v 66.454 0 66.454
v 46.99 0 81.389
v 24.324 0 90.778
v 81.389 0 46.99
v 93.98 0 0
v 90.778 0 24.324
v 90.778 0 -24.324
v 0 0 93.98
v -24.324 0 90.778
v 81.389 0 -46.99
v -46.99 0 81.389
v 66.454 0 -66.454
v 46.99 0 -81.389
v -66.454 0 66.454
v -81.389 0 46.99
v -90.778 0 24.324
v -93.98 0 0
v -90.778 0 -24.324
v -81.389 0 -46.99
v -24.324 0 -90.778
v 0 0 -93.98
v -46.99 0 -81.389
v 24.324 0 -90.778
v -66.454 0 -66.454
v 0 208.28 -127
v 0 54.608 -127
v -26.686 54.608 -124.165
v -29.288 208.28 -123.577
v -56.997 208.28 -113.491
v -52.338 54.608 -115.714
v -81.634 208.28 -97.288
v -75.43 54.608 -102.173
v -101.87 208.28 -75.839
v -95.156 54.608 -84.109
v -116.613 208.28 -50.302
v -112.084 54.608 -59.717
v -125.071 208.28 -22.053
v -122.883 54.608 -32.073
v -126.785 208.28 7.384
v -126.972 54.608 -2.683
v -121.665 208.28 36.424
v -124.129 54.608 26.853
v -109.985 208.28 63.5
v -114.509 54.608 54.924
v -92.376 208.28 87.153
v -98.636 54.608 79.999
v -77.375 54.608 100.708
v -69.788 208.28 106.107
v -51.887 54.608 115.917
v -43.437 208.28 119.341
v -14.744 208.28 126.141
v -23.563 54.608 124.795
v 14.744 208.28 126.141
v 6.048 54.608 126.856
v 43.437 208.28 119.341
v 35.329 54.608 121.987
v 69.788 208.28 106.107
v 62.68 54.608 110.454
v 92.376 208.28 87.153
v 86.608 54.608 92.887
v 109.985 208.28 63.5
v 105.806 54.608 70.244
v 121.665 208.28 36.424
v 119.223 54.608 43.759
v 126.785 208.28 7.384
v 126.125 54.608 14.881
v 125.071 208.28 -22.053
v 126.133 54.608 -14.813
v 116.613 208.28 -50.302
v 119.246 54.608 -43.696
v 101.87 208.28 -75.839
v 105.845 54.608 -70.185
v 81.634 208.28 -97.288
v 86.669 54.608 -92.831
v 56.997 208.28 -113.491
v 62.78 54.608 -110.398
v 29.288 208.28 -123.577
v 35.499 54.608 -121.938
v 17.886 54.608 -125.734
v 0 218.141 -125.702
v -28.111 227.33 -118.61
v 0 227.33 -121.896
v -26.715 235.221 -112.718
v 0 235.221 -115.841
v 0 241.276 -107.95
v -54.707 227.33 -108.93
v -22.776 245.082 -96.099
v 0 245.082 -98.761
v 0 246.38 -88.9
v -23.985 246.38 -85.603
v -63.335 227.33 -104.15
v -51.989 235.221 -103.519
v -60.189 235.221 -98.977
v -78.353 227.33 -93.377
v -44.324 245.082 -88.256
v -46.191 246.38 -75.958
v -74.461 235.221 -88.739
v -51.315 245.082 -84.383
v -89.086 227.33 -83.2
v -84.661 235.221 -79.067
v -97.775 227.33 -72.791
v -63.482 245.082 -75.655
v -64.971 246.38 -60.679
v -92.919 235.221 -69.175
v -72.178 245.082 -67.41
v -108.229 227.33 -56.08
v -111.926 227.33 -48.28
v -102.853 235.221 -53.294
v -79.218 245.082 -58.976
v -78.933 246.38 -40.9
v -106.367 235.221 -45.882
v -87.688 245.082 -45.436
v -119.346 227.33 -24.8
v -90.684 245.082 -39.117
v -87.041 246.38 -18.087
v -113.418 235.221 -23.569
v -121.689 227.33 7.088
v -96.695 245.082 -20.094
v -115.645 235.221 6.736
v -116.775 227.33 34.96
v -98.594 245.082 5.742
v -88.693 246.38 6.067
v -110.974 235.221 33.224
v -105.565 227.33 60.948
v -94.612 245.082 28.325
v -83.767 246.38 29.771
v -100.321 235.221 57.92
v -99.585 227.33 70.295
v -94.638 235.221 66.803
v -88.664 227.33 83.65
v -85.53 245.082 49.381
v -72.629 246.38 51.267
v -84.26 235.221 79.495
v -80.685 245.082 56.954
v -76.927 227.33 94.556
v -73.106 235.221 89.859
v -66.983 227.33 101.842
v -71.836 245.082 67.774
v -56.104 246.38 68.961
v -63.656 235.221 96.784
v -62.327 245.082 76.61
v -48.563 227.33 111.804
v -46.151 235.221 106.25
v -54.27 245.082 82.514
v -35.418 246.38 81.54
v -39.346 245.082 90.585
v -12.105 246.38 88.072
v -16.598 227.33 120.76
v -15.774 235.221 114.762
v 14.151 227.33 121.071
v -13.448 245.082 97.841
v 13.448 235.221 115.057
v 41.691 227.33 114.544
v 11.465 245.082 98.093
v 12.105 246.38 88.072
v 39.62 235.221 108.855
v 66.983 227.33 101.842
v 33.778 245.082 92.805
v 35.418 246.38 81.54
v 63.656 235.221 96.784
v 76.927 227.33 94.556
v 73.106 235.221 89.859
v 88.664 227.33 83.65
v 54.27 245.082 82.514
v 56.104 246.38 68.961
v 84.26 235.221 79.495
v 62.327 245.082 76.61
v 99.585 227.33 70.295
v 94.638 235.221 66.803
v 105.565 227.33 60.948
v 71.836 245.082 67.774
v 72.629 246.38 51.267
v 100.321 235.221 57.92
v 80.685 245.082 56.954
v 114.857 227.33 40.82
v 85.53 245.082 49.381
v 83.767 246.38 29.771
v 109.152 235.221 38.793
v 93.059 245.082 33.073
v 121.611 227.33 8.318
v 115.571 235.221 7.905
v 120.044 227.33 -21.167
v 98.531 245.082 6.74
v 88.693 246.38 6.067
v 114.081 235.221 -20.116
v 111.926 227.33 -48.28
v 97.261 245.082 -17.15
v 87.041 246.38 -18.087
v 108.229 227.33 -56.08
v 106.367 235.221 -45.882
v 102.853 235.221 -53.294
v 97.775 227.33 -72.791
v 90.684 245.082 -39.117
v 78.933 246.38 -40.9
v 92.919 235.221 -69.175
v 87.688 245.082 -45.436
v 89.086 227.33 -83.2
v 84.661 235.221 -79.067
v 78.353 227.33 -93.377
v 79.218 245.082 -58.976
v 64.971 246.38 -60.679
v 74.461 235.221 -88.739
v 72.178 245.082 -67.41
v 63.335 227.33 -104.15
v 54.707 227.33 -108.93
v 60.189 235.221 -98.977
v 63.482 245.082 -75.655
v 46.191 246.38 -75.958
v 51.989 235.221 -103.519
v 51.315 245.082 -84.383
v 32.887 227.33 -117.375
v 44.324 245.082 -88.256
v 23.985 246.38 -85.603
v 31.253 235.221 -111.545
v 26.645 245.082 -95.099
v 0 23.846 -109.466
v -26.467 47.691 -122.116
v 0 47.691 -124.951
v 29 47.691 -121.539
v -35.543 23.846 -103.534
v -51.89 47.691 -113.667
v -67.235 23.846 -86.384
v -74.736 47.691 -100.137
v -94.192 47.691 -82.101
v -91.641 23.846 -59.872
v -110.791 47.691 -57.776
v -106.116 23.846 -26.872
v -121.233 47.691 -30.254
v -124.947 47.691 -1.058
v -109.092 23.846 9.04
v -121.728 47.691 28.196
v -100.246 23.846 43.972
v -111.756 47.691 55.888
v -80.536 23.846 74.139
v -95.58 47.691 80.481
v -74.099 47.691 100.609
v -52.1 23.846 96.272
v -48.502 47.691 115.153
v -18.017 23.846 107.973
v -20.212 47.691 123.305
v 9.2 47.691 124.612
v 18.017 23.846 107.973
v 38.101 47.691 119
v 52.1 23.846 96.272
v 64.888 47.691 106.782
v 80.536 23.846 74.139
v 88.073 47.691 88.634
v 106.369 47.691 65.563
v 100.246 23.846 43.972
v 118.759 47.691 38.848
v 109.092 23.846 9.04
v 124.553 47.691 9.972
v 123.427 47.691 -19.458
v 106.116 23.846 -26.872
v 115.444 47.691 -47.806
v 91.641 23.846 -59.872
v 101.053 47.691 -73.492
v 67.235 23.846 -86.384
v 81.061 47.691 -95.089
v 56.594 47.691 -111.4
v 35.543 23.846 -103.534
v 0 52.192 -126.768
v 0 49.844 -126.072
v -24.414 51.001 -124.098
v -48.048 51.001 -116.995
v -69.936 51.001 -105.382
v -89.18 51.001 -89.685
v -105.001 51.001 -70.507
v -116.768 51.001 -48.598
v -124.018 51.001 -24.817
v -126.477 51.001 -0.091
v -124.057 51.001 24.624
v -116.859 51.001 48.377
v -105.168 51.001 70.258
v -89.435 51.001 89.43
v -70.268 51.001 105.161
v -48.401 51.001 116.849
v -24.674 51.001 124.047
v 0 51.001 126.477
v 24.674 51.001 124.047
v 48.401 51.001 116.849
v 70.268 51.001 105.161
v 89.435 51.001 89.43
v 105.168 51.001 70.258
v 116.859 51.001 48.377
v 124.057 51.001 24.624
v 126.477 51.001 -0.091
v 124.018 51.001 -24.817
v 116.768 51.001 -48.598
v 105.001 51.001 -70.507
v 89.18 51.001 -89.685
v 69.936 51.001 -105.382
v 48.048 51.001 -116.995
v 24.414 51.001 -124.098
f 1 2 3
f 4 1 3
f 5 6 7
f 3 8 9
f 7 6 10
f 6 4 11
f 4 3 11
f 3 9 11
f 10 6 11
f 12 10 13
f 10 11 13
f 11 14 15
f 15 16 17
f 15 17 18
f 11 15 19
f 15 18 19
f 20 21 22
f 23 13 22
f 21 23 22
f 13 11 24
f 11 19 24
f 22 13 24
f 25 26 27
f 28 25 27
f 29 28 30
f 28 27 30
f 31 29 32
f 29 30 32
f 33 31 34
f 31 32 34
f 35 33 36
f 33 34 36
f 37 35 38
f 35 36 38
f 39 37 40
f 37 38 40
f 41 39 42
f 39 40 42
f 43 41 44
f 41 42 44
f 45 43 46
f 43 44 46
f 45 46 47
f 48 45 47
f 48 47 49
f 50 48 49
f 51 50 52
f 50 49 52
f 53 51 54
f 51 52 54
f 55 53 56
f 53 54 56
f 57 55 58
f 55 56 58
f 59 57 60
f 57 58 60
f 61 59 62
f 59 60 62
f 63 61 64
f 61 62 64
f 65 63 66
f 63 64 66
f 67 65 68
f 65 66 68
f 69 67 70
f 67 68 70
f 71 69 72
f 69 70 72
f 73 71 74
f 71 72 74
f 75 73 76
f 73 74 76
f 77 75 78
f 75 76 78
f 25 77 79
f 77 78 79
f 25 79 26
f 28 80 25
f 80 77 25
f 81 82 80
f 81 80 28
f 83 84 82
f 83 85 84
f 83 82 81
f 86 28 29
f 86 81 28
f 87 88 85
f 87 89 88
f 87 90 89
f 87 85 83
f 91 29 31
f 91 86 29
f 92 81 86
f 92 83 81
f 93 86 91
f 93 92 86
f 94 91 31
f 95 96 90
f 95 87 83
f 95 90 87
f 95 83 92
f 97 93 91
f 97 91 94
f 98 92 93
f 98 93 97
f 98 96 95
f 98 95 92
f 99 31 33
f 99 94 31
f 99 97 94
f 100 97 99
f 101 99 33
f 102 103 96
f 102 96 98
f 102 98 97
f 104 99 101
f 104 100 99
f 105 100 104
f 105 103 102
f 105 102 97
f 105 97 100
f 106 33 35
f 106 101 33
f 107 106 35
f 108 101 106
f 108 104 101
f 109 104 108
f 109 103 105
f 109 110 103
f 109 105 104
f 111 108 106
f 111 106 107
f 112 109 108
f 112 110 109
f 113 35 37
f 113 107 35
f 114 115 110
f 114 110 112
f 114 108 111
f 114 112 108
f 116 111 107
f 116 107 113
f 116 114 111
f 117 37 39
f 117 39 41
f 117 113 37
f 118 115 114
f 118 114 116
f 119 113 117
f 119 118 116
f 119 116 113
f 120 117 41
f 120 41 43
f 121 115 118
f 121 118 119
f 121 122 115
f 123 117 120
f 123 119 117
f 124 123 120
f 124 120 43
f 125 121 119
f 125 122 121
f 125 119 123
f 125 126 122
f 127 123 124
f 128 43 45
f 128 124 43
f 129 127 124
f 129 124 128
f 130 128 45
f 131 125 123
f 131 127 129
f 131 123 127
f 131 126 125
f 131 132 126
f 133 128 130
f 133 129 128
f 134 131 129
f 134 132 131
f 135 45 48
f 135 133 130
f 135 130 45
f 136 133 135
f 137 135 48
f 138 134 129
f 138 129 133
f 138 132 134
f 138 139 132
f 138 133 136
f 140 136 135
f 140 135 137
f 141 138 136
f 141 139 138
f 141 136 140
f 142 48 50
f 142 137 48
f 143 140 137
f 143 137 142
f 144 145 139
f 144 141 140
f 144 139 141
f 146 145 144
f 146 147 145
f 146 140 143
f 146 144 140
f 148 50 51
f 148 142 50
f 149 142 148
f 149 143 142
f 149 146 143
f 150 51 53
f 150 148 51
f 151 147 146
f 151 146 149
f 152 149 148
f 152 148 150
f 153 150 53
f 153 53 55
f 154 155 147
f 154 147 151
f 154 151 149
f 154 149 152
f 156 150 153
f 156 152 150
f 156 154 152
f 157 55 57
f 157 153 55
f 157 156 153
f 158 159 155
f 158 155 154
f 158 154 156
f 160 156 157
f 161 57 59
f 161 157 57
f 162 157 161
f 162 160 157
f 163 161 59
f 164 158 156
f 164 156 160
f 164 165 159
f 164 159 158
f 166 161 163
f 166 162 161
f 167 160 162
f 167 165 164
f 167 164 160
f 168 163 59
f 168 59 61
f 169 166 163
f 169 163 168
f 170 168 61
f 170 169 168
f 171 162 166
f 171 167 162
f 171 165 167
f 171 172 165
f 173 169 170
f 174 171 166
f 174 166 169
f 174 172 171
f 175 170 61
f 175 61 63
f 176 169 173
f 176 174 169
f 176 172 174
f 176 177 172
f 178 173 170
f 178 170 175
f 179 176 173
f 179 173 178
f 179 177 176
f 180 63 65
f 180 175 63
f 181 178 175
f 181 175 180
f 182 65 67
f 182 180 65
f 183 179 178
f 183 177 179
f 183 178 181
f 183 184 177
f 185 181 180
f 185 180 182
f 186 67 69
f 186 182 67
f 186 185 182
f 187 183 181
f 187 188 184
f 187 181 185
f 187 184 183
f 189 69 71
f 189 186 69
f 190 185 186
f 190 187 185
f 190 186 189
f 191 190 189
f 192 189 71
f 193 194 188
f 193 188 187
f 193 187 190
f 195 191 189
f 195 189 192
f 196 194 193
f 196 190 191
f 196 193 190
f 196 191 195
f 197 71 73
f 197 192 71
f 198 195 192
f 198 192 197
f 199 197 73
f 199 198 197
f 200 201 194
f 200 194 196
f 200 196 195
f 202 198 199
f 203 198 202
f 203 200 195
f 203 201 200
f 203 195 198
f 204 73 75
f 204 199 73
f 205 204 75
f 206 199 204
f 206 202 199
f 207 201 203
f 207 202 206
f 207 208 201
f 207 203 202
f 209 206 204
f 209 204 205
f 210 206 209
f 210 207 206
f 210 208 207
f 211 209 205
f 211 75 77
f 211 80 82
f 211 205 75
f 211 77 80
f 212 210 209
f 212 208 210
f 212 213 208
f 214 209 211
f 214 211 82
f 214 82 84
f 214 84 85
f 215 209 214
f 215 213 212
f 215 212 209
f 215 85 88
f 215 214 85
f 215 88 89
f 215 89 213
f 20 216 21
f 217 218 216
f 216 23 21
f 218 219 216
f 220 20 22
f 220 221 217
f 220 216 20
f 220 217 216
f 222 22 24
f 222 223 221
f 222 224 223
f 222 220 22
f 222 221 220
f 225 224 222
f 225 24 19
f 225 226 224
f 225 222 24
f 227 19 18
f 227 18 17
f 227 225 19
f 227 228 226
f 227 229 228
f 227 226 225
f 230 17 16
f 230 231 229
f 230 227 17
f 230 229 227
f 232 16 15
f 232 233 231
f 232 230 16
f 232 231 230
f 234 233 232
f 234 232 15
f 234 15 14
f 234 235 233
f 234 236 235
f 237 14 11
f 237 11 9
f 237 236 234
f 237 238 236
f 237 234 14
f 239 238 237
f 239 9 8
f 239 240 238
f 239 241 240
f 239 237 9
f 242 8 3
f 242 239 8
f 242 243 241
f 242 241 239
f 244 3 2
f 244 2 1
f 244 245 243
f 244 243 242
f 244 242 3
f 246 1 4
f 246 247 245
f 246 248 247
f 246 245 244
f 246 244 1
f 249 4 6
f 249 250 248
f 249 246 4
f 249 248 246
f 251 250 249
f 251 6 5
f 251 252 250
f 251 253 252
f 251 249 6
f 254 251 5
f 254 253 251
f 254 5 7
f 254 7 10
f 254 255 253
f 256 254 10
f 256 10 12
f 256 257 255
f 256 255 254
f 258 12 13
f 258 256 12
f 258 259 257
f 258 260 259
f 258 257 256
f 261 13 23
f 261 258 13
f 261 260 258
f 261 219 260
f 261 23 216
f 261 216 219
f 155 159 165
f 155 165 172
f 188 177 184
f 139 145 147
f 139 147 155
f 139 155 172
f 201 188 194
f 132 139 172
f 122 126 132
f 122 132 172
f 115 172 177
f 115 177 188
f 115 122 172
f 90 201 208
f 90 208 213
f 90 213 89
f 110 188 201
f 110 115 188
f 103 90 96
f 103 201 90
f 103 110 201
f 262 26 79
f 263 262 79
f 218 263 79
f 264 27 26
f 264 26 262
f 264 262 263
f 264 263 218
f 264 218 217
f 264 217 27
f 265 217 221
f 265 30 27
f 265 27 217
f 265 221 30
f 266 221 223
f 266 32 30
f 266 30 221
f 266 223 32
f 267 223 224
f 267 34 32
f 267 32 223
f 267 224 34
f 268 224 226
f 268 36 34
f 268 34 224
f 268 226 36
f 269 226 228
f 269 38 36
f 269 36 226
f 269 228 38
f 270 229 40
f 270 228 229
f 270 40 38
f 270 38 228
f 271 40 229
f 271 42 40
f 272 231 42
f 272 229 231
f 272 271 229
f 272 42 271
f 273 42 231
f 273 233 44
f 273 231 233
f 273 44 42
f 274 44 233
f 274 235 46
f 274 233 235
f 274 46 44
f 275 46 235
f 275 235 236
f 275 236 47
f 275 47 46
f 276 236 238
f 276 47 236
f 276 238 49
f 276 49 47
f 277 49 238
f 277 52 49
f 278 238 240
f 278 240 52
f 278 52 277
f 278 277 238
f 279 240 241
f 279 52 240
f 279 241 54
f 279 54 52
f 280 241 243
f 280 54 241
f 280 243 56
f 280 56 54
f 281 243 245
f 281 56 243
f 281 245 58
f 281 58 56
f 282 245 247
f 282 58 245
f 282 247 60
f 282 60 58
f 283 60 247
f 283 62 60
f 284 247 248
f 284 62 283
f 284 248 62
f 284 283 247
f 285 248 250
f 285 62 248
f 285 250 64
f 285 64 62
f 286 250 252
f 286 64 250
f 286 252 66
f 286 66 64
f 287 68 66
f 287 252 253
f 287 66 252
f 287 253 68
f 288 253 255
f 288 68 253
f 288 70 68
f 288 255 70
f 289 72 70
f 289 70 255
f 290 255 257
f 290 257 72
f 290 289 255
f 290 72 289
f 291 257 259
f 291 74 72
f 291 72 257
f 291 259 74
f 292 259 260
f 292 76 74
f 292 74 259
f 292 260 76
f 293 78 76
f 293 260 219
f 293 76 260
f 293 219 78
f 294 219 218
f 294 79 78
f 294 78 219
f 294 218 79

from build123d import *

# Parameters (mm, degrees)
SKETCH1_R           = 127
BOSS_EXTRUDE1_DEPTH = 246.38
FILLET1_R           = 38.1
CHAMFER1_SIZE       = 33.02
CHAMFER1_SIZE2      = 50.846341105
FILLET2_R           = 12.7


with BuildPart() as part:
    # Sketch1 → Boss-Extrude1 (new body)
    with BuildSketch(Plane(origin=(0, 0, 0), x_dir=(1, 0, 0), z_dir=(0, 1, 0))):
        with Locations(Location((0, 0, 0), (0, 0, 90))):
            Circle(SKETCH1_R)
    extrude(amount=BOSS_EXTRUDE1_DEPTH)

    # Fillet1
    fillet1_edges = [part.edges().sort_by_distance(p)[0] for p in [
        (0, 246.38, 127),
    ]]
    fillet(fillet1_edges, radius=FILLET1_R)

    # Chamfer1
    chamfer1_edges = [part.edges().sort_by_distance(p)[0] for p in [
        (0, 0, 127),
    ]]
    chamfer1_side = [part.faces().sort_by_distance(p)[0] for p in [
        (0, 0, 0),
    ]]
    chamfer(chamfer1_edges, length=CHAMFER1_SIZE, length2=CHAMFER1_SIZE2, reference=chamfer1_side[0])

    # Fillet2
    fillet2_edges = [part.edges().sort_by_distance(p)[0] for p in [
        (0, 50.846341105, 127),
    ]]
    fillet(fillet2_edges, radius=FILLET2_R)


solid = part.part
